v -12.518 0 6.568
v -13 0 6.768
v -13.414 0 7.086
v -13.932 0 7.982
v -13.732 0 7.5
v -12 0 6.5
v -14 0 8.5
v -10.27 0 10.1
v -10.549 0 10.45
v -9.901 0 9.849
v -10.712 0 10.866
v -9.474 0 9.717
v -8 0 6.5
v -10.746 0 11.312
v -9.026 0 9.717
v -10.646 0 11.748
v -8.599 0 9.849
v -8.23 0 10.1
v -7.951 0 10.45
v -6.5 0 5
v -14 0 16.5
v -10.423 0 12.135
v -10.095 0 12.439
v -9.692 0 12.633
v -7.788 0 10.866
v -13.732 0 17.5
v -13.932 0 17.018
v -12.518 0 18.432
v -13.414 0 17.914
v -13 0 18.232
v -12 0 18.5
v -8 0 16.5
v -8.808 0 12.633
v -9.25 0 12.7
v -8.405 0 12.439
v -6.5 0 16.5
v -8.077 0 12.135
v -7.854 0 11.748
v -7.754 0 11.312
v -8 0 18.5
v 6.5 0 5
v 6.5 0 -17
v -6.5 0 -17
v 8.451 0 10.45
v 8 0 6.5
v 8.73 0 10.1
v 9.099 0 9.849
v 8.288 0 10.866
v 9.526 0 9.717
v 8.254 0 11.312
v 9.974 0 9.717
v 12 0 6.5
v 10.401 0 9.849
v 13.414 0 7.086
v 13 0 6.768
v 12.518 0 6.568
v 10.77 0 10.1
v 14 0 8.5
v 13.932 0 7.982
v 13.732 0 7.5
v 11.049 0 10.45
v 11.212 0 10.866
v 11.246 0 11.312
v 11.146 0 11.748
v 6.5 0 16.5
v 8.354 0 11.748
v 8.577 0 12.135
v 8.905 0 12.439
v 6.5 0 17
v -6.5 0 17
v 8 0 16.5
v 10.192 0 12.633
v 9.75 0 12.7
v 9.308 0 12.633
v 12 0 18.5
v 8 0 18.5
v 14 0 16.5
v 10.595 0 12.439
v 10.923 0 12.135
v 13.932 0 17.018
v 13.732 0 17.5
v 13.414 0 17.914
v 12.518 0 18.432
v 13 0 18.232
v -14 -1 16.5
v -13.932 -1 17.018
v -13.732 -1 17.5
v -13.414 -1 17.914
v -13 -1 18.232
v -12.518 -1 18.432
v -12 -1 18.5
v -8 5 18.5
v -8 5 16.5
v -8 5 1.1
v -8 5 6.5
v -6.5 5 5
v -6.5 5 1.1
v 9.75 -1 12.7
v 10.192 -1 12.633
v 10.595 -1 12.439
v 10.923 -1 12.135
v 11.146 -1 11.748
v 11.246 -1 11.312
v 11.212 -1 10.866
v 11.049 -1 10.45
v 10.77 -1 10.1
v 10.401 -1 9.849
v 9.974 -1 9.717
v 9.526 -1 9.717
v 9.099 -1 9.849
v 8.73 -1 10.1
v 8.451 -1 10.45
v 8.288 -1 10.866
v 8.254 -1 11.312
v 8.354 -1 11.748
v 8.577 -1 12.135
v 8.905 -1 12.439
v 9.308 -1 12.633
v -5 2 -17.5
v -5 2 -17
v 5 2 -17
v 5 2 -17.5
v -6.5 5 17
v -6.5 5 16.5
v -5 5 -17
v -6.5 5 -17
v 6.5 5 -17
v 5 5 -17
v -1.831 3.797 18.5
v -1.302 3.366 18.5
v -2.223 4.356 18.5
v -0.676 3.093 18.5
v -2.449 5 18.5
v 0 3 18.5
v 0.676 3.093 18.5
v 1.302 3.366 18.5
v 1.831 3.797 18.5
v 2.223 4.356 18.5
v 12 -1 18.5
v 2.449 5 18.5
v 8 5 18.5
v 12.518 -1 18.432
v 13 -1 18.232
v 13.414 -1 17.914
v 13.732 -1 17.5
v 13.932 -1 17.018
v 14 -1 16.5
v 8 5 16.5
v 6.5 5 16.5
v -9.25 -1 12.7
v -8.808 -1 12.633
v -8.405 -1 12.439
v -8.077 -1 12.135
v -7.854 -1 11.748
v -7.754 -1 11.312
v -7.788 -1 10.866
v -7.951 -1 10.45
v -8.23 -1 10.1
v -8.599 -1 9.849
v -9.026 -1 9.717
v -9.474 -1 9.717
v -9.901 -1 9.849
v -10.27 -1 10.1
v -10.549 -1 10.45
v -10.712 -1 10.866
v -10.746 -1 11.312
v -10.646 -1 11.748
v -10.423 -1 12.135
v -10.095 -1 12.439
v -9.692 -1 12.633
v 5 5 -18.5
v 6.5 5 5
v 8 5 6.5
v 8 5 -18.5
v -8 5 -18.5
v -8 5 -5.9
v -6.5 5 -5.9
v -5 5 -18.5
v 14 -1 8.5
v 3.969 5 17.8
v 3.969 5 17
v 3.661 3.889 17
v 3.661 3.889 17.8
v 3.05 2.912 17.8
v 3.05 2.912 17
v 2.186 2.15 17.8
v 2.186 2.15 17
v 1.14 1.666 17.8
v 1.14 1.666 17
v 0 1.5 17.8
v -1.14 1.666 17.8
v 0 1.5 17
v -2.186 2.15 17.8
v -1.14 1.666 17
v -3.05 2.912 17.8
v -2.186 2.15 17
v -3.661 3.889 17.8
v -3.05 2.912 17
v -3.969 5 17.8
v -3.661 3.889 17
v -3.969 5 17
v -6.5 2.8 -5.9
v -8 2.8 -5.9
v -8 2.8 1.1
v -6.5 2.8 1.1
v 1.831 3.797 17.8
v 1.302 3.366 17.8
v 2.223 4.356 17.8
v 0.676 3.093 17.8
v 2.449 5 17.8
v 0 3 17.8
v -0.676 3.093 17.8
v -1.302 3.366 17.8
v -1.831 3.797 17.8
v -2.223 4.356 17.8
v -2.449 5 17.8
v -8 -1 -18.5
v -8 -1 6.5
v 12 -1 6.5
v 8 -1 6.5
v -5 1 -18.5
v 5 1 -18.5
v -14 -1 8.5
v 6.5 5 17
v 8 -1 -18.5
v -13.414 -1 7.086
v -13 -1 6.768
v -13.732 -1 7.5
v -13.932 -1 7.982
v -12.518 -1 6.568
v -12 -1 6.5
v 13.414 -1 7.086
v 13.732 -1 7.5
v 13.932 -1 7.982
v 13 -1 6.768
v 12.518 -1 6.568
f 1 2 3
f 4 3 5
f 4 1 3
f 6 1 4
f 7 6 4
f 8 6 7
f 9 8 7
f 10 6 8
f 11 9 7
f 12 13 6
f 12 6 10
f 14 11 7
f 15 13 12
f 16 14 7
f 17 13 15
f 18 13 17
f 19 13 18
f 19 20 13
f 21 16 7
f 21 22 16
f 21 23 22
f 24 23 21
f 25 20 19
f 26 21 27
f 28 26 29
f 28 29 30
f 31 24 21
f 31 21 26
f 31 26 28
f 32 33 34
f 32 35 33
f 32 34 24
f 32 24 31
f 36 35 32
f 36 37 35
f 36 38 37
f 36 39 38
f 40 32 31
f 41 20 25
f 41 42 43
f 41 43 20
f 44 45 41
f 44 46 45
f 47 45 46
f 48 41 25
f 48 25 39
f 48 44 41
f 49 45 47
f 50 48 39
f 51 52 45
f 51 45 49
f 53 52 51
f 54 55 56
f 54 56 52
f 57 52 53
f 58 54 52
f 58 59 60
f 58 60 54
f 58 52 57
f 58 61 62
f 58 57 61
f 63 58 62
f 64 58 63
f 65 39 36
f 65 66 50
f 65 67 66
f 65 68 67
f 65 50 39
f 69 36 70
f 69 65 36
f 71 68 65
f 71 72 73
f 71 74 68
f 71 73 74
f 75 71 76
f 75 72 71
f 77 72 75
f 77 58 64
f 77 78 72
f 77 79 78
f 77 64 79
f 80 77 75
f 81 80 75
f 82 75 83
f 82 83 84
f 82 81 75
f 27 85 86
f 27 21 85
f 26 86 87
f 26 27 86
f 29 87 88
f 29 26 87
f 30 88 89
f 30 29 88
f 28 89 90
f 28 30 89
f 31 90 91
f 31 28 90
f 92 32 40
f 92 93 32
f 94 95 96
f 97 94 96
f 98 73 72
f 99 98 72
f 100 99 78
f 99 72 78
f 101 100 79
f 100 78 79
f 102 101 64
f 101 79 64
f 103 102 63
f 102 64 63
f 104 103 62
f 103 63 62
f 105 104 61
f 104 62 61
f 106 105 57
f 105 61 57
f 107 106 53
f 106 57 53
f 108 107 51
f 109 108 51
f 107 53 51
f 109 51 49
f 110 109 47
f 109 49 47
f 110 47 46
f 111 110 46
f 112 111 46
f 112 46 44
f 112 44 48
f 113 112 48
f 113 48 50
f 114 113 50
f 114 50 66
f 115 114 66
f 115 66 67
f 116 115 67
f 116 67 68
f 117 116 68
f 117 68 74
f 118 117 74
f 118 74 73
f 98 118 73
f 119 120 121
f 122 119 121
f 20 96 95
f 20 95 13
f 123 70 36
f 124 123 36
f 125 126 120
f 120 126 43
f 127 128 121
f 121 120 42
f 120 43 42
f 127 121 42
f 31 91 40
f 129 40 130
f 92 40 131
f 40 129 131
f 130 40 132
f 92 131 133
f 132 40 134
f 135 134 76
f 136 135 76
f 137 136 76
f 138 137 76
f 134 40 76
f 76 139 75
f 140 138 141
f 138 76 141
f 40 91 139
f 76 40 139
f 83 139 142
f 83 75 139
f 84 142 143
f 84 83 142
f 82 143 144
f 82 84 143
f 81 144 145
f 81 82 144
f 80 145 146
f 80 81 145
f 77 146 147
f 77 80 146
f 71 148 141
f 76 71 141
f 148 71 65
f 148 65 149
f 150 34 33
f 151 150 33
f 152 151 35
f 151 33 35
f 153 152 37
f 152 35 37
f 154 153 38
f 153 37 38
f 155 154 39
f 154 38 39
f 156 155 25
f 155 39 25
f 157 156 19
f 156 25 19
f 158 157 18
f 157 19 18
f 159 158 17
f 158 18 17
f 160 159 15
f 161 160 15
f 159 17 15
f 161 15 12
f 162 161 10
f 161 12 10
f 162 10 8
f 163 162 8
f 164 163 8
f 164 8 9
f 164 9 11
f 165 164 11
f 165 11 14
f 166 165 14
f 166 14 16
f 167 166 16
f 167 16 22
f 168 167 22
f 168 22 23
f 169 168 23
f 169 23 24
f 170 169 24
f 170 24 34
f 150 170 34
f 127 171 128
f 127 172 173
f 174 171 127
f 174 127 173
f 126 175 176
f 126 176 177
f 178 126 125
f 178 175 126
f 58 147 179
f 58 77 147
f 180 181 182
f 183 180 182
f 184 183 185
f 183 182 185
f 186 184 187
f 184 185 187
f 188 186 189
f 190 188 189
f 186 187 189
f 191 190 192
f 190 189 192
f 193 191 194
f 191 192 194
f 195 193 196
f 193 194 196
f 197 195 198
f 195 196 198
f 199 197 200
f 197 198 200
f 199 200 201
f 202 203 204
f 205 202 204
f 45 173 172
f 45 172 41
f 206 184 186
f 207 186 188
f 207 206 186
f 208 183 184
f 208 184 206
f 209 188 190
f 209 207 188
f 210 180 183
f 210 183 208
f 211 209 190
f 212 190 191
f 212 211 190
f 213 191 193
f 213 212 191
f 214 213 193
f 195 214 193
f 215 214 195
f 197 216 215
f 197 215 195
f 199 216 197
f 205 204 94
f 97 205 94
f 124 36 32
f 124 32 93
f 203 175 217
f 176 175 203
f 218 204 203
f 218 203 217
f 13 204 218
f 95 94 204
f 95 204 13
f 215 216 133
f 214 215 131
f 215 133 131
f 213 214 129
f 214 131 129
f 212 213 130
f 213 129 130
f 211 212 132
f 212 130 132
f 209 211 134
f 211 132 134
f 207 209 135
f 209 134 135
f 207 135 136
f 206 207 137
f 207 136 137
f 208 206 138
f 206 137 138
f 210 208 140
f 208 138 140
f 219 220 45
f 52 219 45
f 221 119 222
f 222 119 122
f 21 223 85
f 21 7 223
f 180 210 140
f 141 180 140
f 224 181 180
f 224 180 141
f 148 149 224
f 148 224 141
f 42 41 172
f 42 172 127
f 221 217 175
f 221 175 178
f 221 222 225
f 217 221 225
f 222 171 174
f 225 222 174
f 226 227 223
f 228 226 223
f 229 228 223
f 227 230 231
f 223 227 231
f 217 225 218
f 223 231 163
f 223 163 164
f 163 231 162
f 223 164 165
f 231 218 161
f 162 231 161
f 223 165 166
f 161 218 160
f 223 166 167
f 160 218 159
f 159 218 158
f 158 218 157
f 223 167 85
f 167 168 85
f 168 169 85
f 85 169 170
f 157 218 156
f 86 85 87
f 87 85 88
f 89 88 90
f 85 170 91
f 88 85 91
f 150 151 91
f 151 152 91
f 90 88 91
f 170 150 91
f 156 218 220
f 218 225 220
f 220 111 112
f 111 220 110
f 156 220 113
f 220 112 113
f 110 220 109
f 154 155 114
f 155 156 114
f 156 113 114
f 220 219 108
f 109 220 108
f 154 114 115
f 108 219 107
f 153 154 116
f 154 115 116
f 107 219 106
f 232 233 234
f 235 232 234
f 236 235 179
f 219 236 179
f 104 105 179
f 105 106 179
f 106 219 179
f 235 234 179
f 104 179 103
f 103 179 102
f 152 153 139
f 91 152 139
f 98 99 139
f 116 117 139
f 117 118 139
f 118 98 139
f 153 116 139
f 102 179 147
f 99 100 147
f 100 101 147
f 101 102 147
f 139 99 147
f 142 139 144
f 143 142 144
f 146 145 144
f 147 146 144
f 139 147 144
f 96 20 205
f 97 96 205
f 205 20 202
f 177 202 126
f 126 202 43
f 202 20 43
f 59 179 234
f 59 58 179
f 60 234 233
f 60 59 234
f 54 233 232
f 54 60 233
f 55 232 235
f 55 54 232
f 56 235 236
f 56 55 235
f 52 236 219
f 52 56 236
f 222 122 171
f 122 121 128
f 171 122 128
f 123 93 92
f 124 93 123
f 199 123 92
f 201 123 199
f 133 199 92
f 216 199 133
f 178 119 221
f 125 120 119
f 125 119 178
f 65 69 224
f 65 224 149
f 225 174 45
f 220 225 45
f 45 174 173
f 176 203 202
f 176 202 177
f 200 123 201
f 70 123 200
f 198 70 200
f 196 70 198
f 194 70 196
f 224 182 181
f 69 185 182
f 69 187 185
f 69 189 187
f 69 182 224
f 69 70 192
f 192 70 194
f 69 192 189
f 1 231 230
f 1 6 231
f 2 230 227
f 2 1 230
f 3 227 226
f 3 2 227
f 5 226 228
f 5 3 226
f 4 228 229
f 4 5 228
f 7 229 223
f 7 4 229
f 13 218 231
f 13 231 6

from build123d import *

# Parameters (mm, degrees)
SKETCH1_W           = 16
SKETCH1_H           = 37
SKETCH1_W_2         = 13
SKETCH1_H_2         = 34
BOSS_EXTRUDE1_DEPTH = 5
SKETCH2_W           = 16
SKETCH2_H           = 37
BOSS_EXTRUDE2_DEPTH = 1
SKETCH3_W           = 10
SKETCH3_H           = 5
CUT_EXTRUDE1_DEPTH  = 21
SKETCH4_W           = 7
SKETCH4_H           = 2.2
CUT_EXTRUDE2_DEPTH  = 2
SKETCH5_R           = 2.5
CUT_EXTRUDE3_DEPTH  = 2
SKETCH6_W           = 10
SKETCH6_H           = 3
CUT_EXTRUDE4_DEPTH  = 2
CHAMFER1_SIZE       = 1
SKETCH7_W           = 12
SKETCH7_H           = 1
BOSS_EXTRUDE3_DEPTH = 6
SKETCH8_W           = 12
SKETCH8_H           = 1
BOSS_EXTRUDE4_DEPTH = 6
FILLET1_R           = 2
SKETCH9_R           = 1.5
CUT_EXTRUDE5_DEPTH  = 6
SKETCH12_R          = 4
CUT_EXTRUDE6_DEPTH  = 0.8
CHAMFER2_SIZE       = 1.5


with BuildPart() as part:
    # Sketch1 → Boss-Extrude1 (new body)
    with BuildSketch(Plane(origin=(0, 0, 0), x_dir=(1, 0, 0), z_dir=(0, 1, 0))):
        Rectangle(SKETCH1_W, SKETCH1_H)
        Rectangle(SKETCH1_W_2, SKETCH1_H_2, mode=Mode.SUBTRACT)
    extrude(amount=BOSS_EXTRUDE1_DEPTH)

    # Sketch2 → Boss-Extrude2 (add)
    with BuildSketch(Plane.XZ):
        Rectangle(SKETCH2_W, SKETCH2_H)
    extrude(amount=BOSS_EXTRUDE2_DEPTH)

    # Sketch3 → Cut-Extrude1 (cut)
    with BuildSketch(Plane(origin=(8, 0, 0), x_dir=(0, 0, -1), z_dir=(1, 0, 0))):
        with Locations((-11.5, 2.5)):
            Rectangle(SKETCH3_W, SKETCH3_H)
    extrude(amount=-CUT_EXTRUDE1_DEPTH, mode=Mode.SUBTRACT)

    # Sketch4 → Cut-Extrude2 (cut)
    with BuildSketch(Plane.ZY.offset(8)):
        with Locations((-2.4, 3.9)):
            Rectangle(SKETCH4_W, SKETCH4_H)
    extrude(amount=-CUT_EXTRUDE2_DEPTH, mode=Mode.SUBTRACT)

    # Sketch5 → Cut-Extrude3 (cut)
    with BuildSketch(Plane.XY.offset(18.5)):
        with Locations((0, 5.5)):
            Circle(SKETCH5_R)
    extrude(amount=-CUT_EXTRUDE3_DEPTH, mode=Mode.SUBTRACT)

    # Sketch6 → Cut-Extrude4 (cut)
    with BuildSketch(Plane.XY.offset(-17)):
        with Locations((0, 3.5)):
            Rectangle(SKETCH6_W, SKETCH6_H)
    extrude(amount=-CUT_EXTRUDE4_DEPTH, mode=Mode.SUBTRACT)

    # Chamfer1
    chamfer1_edges = [part.edges().sort_by_distance(p)[0] for p in [
        (0, 2, -18.5),
    ]]
    chamfer(chamfer1_edges, length=CHAMFER1_SIZE)

    # Sketch7 → Boss-Extrude3 (add)
    with BuildSketch(Plane(origin=(8, 0, 0), x_dir=(0, 0, -1), z_dir=(1, 0, 0))):
        with Locations((-12.5, -0.5)):
            Rectangle(SKETCH7_W, SKETCH7_H)
    extrude(amount=BOSS_EXTRUDE3_DEPTH)

    # Sketch8 → Boss-Extrude4 (add)
    with BuildSketch(Plane.ZY.offset(8)):
        with Locations((12.5, -0.5)):
            Rectangle(SKETCH8_W, SKETCH8_H)
    extrude(amount=BOSS_EXTRUDE4_DEPTH)

    # Fillet1
    fillet1_edges = [part.edges().sort_by_distance(p)[0] for p in [
        (14, -0.5, 18.5),
        (14, -0.5, 6.5),
        (-14, -0.5, 18.5),
        (-14, -0.5, 6.5),
    ]]
    fillet(fillet1_edges, radius=FILLET1_R)

    # Sketch9 → Cut-Extrude5 (cut)
    with BuildSketch(Plane(origin=(0, 0, 0), x_dir=(1, 0, 0), z_dir=(0, 1, 0))):
        with Locations(Location((-9.25, -11.2, 0), (0, 0, 270))):
            Circle(SKETCH9_R)
        with Locations(Location((9.75, -11.2, 0), (0, 0, 270))):
            Circle(SKETCH9_R)
    extrude(amount=-CUT_EXTRUDE5_DEPTH, mode=Mode.SUBTRACT)

    # Sketch12 → Cut-Extrude6 (cut)
    with BuildSketch(Plane(origin=(0, 0, 17), x_dir=(-1, 0, 0), z_dir=(0, 0, -1))):
        with Locations((0, 5.5)):
            Circle(SKETCH12_R)
    extrude(amount=-CUT_EXTRUDE6_DEPTH, mode=Mode.SUBTRACT)

    # Chamfer2
    chamfer2_edges = [part.edges().sort_by_distance(p)[0] for p in [
        (6.5, 2.5, 6.5),
        (-6.5, 2.5, 6.5),
    ]]
    chamfer(chamfer2_edges, length=CHAMFER2_SIZE - 0.0001)  # a hair under: the kernel refuses the full size


solid = part.part
